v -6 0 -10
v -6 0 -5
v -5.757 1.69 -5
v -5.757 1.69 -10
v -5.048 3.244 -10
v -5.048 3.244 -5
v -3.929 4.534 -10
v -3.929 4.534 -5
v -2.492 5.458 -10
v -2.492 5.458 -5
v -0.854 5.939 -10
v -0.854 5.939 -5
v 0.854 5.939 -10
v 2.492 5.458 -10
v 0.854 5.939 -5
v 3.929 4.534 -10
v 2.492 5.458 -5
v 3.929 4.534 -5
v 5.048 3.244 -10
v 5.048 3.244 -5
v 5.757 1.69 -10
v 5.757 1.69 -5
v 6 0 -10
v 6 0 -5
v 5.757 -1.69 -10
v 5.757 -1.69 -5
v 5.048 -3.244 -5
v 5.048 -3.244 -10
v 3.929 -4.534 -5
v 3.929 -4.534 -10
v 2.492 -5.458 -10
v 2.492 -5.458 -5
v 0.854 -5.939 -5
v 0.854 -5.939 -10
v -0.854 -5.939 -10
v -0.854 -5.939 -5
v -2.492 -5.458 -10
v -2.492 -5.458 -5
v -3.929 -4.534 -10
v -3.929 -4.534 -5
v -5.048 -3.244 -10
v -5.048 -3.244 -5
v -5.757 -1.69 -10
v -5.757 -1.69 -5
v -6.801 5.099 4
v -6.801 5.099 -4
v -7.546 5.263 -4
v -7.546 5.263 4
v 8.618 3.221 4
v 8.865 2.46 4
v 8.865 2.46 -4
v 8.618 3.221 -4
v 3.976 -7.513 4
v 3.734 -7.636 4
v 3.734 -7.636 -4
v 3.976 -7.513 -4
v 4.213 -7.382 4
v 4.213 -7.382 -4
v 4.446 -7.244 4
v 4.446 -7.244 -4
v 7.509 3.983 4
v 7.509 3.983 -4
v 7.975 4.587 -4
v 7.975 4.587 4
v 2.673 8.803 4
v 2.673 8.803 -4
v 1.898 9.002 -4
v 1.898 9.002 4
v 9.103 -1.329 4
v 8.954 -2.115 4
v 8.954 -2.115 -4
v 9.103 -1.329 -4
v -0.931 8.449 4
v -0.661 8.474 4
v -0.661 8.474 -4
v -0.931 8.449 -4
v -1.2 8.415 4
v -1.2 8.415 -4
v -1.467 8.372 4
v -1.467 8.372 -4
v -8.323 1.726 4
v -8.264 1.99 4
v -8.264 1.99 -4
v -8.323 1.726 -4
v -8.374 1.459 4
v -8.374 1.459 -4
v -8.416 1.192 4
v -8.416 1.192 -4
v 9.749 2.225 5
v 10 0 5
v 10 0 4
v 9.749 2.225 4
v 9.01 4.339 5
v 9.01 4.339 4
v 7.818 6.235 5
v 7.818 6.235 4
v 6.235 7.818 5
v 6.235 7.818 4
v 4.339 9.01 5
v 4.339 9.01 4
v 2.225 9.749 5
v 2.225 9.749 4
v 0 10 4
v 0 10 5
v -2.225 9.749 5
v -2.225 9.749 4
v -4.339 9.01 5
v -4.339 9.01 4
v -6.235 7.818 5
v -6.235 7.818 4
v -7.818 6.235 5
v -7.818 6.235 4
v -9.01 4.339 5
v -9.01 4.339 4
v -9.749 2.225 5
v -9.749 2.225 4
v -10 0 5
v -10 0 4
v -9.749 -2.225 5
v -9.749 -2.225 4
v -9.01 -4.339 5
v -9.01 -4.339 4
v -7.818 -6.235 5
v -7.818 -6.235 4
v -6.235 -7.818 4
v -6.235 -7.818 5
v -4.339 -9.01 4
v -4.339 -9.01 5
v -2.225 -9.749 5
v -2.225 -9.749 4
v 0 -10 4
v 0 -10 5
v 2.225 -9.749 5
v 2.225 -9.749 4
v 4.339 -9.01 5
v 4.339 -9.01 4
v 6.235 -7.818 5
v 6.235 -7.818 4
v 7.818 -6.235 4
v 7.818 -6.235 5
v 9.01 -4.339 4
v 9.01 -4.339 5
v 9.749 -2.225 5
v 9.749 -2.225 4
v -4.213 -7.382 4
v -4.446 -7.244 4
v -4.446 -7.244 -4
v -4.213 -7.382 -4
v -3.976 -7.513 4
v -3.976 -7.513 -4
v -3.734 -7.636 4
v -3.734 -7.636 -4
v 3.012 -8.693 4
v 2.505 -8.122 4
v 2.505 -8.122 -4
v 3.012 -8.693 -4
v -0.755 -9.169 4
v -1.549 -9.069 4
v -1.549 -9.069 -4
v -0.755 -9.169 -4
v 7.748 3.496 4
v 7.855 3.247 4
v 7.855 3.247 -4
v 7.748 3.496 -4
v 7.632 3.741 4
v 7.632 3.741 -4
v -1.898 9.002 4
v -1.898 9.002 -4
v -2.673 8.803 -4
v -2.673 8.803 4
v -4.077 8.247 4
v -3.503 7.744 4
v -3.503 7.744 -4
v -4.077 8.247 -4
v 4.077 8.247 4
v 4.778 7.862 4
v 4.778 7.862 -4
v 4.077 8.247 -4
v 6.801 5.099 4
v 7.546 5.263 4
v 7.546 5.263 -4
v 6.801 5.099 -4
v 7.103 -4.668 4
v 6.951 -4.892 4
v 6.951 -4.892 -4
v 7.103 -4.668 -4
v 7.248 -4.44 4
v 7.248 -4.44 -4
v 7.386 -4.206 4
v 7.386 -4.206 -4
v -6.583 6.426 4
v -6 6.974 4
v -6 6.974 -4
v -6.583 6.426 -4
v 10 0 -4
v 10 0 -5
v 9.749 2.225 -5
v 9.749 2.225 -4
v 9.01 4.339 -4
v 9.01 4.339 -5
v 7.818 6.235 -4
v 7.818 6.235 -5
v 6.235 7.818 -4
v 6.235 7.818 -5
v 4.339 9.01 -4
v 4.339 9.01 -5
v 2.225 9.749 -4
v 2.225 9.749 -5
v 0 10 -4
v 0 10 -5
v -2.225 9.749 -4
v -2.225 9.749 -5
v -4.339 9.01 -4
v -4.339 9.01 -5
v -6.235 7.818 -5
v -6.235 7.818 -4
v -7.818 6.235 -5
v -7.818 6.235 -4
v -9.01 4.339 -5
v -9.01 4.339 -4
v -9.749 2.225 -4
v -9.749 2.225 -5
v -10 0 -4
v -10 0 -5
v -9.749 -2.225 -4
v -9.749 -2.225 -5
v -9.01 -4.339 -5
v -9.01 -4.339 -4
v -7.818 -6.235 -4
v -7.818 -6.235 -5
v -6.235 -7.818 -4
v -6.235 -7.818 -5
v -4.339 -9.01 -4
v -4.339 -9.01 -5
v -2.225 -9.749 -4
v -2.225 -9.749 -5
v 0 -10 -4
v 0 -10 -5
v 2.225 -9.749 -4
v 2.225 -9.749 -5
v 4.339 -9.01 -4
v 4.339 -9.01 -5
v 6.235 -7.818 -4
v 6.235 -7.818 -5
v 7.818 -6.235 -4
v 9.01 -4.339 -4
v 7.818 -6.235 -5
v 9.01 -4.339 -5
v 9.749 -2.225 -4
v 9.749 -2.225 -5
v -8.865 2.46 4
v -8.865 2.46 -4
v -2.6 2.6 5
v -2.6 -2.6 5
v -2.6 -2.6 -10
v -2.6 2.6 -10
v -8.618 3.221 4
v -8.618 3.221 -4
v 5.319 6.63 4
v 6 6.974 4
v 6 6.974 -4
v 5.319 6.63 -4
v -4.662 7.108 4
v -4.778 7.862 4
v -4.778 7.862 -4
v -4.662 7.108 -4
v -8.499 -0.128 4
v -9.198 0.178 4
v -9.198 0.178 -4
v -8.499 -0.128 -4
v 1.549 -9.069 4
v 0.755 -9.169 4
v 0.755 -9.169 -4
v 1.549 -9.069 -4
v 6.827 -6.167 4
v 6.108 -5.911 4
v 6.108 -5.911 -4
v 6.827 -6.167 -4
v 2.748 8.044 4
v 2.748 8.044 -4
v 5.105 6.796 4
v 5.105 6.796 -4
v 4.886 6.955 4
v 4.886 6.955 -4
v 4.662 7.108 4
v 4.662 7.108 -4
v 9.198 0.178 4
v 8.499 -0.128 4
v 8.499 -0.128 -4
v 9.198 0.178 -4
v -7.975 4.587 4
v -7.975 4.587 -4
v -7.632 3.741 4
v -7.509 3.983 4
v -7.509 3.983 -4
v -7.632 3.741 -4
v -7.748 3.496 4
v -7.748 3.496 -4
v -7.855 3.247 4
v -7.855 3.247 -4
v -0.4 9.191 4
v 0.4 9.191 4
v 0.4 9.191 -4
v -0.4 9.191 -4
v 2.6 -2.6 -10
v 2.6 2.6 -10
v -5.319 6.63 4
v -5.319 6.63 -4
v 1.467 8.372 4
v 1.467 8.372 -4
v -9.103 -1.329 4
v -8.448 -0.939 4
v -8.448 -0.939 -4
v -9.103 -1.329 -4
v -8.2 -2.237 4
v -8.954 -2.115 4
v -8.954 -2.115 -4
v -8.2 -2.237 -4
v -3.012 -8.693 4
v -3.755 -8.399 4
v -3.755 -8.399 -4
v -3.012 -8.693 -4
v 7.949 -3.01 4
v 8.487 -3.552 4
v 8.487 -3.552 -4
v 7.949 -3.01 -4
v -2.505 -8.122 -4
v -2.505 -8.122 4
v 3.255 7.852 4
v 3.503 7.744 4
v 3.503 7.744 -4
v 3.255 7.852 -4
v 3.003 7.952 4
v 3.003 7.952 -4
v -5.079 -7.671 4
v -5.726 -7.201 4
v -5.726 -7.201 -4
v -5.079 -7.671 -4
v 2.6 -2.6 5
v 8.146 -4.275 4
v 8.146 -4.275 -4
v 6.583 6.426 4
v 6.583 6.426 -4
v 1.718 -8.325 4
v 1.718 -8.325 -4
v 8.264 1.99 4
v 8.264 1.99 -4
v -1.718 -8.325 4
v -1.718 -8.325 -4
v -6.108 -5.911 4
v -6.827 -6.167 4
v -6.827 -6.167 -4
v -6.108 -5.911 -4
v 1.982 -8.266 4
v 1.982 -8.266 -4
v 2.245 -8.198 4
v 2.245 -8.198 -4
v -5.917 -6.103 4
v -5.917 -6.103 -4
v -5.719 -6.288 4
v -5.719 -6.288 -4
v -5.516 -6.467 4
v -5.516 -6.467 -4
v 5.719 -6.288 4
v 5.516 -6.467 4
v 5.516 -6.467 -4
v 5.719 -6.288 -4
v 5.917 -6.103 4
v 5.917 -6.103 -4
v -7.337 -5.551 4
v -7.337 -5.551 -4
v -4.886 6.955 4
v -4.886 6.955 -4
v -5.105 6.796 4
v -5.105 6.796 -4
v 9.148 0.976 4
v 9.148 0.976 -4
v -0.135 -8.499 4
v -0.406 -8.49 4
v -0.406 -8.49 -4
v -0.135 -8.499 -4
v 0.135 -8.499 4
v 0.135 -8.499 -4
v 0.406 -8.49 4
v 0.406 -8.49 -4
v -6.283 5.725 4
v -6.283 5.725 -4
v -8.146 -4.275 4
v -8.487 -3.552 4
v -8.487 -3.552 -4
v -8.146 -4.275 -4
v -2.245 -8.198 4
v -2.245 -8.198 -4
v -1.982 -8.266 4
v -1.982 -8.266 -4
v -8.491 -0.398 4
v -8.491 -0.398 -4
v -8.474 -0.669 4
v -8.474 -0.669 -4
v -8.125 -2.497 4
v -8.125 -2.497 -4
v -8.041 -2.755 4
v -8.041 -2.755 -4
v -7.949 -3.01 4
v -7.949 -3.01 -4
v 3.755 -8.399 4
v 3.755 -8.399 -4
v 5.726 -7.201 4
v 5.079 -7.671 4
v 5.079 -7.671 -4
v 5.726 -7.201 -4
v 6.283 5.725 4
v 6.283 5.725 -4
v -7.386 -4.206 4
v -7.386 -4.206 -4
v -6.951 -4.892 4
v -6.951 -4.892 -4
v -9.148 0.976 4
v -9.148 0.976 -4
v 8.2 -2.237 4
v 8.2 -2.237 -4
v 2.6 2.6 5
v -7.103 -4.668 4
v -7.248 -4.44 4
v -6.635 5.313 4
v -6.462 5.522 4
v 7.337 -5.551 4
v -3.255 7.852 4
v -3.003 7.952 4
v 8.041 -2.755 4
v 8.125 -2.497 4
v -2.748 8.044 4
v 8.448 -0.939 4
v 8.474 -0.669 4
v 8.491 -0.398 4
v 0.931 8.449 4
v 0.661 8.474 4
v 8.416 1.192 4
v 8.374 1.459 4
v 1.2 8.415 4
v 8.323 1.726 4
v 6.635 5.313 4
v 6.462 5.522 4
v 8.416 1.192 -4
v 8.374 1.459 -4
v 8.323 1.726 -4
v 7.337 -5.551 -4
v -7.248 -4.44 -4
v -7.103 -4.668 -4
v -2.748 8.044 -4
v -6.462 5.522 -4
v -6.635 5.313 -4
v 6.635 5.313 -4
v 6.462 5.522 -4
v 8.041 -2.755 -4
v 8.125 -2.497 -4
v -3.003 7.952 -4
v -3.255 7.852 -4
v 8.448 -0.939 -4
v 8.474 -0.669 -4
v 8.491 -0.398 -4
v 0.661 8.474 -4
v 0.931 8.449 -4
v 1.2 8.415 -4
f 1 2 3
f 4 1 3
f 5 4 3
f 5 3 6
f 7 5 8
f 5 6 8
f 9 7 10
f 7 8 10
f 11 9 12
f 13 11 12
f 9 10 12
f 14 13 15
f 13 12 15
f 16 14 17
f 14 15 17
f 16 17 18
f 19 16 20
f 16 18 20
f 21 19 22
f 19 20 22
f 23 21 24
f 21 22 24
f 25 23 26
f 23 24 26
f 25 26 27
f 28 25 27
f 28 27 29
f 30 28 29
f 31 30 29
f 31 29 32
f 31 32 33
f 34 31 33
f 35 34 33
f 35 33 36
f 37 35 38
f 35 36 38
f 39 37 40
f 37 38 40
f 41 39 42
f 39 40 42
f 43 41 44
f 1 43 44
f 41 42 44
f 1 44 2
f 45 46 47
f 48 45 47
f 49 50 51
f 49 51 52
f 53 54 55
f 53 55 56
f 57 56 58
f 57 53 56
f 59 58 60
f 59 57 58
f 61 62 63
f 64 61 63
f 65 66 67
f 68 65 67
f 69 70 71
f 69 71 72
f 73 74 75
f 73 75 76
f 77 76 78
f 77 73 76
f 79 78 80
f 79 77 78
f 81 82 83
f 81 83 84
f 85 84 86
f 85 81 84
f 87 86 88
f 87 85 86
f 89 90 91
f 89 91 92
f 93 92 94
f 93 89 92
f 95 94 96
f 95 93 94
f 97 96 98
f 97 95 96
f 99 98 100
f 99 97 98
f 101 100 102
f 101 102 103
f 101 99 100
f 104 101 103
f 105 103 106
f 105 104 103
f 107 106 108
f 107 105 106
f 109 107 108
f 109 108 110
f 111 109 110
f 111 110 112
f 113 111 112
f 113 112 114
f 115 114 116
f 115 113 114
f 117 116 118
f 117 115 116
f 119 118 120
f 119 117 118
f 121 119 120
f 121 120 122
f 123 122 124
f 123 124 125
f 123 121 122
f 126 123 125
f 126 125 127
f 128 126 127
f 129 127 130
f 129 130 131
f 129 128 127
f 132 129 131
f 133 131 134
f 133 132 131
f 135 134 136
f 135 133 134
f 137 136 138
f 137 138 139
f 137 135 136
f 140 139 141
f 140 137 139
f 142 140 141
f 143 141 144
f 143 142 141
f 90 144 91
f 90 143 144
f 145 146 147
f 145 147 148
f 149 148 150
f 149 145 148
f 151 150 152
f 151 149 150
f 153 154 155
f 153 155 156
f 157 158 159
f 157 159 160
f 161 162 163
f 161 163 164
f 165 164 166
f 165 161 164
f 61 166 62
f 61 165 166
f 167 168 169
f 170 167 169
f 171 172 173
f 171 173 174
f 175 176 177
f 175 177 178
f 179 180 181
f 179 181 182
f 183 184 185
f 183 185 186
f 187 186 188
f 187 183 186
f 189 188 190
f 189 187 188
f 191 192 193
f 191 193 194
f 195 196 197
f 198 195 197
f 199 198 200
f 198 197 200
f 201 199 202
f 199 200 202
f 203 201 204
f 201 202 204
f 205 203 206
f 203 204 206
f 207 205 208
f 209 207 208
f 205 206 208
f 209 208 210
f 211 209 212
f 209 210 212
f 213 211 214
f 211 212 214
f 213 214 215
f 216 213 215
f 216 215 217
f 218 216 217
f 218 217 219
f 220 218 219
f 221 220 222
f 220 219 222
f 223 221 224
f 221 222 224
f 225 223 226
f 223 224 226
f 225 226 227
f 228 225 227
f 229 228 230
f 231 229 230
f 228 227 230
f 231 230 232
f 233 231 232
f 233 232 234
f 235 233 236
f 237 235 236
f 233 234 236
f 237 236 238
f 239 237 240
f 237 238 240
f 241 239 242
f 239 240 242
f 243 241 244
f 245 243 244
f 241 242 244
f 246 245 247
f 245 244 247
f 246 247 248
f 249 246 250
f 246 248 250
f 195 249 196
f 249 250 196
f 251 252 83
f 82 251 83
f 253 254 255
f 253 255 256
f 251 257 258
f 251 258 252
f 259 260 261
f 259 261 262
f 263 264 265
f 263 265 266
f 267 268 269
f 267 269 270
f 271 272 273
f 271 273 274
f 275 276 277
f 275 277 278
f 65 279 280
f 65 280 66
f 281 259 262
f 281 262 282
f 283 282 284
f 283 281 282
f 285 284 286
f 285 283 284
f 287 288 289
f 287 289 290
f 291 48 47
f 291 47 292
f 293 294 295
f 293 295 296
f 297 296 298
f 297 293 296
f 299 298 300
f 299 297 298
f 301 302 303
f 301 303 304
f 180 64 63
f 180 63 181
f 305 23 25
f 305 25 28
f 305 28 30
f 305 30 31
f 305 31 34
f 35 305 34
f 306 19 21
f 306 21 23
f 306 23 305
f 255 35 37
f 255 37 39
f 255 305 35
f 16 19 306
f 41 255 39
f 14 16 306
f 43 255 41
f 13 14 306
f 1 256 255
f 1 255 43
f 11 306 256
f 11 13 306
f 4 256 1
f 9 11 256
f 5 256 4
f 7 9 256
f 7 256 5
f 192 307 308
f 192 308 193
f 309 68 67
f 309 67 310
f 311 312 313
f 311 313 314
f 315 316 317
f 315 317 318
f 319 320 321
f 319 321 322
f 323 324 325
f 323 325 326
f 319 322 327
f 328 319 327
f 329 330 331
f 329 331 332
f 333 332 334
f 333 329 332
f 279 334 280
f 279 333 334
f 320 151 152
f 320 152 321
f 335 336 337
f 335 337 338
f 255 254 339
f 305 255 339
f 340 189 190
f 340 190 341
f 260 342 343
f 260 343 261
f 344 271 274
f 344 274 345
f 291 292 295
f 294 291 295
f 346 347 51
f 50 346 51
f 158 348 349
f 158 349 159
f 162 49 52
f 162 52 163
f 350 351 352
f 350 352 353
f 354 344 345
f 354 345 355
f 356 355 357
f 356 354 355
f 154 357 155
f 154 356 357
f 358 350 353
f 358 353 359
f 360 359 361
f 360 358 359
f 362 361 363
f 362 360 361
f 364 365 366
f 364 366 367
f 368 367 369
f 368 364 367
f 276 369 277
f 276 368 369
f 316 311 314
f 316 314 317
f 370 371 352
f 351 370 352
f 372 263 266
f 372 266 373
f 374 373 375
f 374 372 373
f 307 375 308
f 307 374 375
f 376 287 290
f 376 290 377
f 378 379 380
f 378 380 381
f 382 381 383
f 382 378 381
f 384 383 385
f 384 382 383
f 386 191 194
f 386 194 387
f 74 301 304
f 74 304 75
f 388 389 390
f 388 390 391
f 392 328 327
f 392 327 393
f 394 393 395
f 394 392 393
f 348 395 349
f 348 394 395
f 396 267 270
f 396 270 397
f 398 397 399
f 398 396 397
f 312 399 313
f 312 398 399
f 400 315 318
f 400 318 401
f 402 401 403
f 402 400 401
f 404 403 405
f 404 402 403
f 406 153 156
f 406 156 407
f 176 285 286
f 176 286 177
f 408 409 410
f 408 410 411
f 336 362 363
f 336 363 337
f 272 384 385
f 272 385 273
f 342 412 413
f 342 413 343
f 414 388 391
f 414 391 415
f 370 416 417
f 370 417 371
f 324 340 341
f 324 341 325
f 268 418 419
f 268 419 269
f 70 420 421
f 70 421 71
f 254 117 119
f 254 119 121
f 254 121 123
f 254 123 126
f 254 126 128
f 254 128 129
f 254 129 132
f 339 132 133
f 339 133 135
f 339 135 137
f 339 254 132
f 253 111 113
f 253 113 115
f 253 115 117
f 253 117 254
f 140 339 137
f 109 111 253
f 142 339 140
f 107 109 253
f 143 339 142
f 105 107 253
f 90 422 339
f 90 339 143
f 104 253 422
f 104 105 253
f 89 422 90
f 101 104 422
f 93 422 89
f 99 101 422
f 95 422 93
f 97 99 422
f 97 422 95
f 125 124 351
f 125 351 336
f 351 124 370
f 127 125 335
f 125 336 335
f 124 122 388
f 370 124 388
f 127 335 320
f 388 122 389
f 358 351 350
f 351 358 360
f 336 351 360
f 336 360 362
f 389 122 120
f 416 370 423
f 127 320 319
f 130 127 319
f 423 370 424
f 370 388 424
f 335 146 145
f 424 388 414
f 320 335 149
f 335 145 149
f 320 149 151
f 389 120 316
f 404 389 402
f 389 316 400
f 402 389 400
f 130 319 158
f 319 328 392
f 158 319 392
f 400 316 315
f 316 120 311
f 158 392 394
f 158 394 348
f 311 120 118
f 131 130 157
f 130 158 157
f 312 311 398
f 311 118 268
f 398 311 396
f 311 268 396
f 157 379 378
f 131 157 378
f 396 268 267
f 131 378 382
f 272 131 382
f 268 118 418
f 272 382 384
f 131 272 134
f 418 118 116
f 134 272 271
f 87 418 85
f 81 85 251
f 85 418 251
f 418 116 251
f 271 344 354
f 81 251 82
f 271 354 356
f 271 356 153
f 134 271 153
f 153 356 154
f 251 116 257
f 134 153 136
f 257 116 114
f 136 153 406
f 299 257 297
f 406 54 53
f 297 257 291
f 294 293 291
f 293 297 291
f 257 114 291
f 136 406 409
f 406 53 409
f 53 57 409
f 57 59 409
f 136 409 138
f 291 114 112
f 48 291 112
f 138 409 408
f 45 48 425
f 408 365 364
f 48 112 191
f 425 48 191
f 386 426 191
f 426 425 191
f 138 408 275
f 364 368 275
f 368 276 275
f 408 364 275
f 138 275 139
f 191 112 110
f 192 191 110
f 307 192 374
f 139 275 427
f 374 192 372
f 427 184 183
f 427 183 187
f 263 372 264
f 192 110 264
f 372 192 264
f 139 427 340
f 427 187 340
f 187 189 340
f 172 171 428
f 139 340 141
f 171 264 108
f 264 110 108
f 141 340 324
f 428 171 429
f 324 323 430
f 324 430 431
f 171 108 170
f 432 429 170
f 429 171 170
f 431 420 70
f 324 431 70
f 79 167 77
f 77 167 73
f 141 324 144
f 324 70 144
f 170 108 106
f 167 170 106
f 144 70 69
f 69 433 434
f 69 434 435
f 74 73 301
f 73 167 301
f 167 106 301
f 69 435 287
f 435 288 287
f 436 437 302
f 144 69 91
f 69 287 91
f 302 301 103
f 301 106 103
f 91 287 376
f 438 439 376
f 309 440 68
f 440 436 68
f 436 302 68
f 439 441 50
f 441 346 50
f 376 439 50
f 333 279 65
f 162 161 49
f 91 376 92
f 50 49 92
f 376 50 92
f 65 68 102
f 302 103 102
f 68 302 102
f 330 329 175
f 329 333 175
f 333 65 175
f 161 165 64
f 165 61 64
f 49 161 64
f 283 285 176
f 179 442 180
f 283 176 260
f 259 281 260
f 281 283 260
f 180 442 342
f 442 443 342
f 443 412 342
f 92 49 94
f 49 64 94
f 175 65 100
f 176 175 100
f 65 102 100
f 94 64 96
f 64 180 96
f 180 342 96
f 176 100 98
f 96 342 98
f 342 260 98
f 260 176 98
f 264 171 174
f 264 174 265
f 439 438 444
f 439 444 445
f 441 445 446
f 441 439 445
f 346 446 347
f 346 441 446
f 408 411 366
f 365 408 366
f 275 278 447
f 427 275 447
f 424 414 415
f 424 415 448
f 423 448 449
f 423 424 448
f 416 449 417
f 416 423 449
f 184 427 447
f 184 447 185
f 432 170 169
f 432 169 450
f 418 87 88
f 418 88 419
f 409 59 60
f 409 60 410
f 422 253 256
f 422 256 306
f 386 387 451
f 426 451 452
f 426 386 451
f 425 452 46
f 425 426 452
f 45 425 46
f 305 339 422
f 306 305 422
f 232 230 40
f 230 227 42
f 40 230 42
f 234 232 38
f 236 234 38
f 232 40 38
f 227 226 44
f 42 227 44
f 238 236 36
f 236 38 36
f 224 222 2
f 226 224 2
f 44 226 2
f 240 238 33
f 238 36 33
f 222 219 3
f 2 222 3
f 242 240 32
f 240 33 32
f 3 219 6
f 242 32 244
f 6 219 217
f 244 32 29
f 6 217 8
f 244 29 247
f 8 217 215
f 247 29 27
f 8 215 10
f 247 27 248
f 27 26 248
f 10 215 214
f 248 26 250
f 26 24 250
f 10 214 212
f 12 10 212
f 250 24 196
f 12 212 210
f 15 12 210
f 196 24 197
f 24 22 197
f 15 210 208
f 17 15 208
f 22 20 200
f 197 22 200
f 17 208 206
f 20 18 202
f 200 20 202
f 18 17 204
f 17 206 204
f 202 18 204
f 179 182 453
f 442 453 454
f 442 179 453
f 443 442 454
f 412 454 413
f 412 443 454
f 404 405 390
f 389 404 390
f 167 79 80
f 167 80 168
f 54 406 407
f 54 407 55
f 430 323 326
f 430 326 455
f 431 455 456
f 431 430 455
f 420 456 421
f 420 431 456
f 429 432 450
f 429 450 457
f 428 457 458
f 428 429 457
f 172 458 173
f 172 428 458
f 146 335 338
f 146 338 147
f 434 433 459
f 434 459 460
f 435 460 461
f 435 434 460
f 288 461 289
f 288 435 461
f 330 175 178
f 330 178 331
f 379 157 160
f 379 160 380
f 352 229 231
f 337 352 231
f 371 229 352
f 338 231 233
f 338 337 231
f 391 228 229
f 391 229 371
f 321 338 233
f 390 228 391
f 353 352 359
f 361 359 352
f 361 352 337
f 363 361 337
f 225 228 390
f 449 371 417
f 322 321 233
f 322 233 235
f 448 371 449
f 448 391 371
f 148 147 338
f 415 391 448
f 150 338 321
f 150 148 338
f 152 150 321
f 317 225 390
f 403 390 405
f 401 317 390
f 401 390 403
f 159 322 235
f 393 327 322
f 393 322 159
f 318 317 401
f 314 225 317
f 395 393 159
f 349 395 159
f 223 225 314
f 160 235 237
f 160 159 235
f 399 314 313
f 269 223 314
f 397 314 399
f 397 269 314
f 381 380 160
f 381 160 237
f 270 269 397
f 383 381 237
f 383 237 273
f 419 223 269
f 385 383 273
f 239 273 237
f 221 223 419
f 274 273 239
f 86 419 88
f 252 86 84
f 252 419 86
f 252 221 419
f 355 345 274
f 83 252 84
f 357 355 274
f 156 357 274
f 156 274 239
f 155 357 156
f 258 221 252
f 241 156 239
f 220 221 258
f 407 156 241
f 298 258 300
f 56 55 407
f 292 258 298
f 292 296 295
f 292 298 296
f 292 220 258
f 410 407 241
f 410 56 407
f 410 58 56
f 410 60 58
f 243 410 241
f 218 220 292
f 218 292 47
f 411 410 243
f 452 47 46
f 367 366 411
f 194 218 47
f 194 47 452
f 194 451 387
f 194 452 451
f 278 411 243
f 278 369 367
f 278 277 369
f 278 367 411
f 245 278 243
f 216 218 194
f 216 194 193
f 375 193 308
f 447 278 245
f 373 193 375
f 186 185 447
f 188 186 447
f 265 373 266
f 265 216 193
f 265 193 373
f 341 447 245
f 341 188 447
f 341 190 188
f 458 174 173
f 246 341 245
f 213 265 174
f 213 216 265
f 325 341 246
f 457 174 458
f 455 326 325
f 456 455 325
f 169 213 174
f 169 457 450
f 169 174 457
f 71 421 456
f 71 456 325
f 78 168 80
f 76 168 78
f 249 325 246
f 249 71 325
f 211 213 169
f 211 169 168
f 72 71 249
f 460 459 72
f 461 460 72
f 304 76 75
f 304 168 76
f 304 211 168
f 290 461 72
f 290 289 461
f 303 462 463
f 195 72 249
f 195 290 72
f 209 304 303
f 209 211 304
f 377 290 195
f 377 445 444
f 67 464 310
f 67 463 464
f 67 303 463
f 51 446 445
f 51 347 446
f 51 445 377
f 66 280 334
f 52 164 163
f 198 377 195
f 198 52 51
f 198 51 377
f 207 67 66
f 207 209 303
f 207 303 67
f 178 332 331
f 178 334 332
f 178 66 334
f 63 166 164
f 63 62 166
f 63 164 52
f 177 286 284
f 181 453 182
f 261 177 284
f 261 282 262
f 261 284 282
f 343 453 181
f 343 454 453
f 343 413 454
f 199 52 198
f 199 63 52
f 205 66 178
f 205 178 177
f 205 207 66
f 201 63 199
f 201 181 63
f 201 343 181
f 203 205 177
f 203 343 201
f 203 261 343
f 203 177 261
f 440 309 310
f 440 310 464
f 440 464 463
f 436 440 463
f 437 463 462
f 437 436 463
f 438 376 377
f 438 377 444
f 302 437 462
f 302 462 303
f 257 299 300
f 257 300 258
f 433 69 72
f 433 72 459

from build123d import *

# Parameters (mm, degrees)
BOSS_EXTRUDE1_DEPTH = 5
SKETCH2_R           = 10
BOSS_EXTRUDE2_DEPTH = 1
SKETCH4_R           = 6
BOSS_EXTRUDE3_DEPTH = 5
CUT_EXTRUDE1_REACH  = 17
SKETCH5_W           = 5.2
SKETCH5_H           = 5.2


with BuildPart() as part:
    # Sketch1 → Boss-Extrude1 (new body, symmetric)
    with BuildSketch(Plane.XY):
        with BuildLine():
            Line((-0.4, 9.191300234), (-0.660980834, 8.474261286))
            ThreePointArc((-0.660980834, 8.474261286), (-1.065332485, 8.432974961), (-1.467248177, 8.372406033))
            Line((-1.467248177, 8.372406033), (-1.898350154, 9.002014591))
            Line((-1.898350154, 9.002014591), (-2.673216683, 8.803062681))
            Line((-2.673216683, 8.803062681), (-2.747677989, 8.043647535))
            ThreePointArc((-2.747677989, 8.043647535), (-3.129058698, 7.90310013), (-3.503284589, 7.744481718))
            Line((-3.503284589, 7.744481718), (-4.077419986, 8.247099263))
            Line((-4.077419986, 8.247099263), (-4.77846533, 7.861696324))
            Line((-4.77846533, 7.861696324), (-4.66172843, 7.107621828))
            ThreePointArc((-4.66172843, 7.107621828), (-4.996174644, 6.876644452), (-5.319196746, 6.629943135))
            Line((-5.319196746, 6.629943135), (-6.000290524, 6.973988359))
            Line((-6.000290524, 6.973988359), (-6.583465426, 6.426350674))
            Line((-6.583465426, 6.426350674), (-6.282865329, 5.724998101))
            ThreePointArc((-6.282865329, 5.724998101), (-6.549362564, 5.418103913), (-6.80088421, 5.098820841))
            Line((-6.80088421, 5.098820841), (-7.546140742, 5.262676117))
            Line((-7.546140742, 5.262676117), (-7.974802178, 4.587213776))
            Line((-7.974802178, 4.587213776), (-7.509226693, 3.982651688))
            ThreePointArc((-7.509226693, 3.982651688), (-7.691029946, 3.619123978), (-7.855247106, 3.247320882))
            Line((-7.855247106, 3.247320882), (-8.617839183, 3.220690579))
            Line((-8.617839183, 3.220690579), (-8.865052779, 2.459845366))
            Line((-8.865052779, 2.459845366), (-8.263755727, 1.990060623))
            ThreePointArc((-8.263755727, 1.990060623), (-8.349441631, 1.592741174), (-8.416035937, 1.191779808))
            Line((-8.416035937, 1.191779808), (-9.148047095, 0.976337208))
            Line((-9.148047095, 0.976337208), (-9.198279511, 0.177915826))
            Line((-9.198279511, 0.177915826), (-8.499042597, -0.127573271))
            ThreePointArc((-8.499042597, -0.127573271), (-8.483227192, -0.533719416), (-8.448014278, -0.938645173))
            Line((-8.448014278, -0.938645173), (-9.103449564, -1.32936302))
            Line((-9.103449564, -1.32936302), (-8.953544512, -2.115192821))
            Line((-8.953544512, -2.115192821), (-8.200303363, -2.237191266))
            ThreePointArc((-8.200303363, -2.237191266), (-8.083980389, -2.626644452), (-7.949172812, -3.010091627))
            Line((-7.949172812, -3.010091627), (-8.486848816, -3.551534481))
            Line((-8.486848816, -3.551534481), (-8.146225383, -4.275396123))
            Line((-8.146225383, -4.275396123), (-7.38630891, -4.206238307))
            ThreePointArc((-7.38630891, -4.206238307), (-7.176787367, -4.554527757), (-6.950855584, -4.892402953))
            Line((-6.950855584, -4.892402953), (-7.336988145, -5.550549969))
            Line((-7.336988145, -5.550549969), (-6.827048953, -6.166960564))
            Line((-6.827048953, -6.166960564), (-6.108205503, -5.910991925))
            ThreePointArc((-6.108205503, -5.910991925), (-5.8186504, -6.196233333), (-5.515790536, -6.467306608))
            Line((-5.515790536, -6.467306608), (-5.726117525, -7.200803989))
            Line((-5.726117525, -7.200803989), (-5.078903929, -7.671032191))
            Line((-5.078903929, -7.671032191), (-4.44630108, -7.244336181))
            ThreePointArc((-4.44630108, -7.244336181), (-4.09490623, -7.44860678), (-3.734148082, -7.635845605))
            Line((-3.734148082, -7.635845605), (-3.755453882, -8.398605012))
            Line((-3.755453882, -8.398605012), (-3.011632693, -8.693104654))
            Line((-3.011632693, -8.693104654), (-2.505019208, -8.122492153))
            ThreePointArc((-2.505019208, -8.122492153), (-2.113864041, -8.23295687), (-1.717875372, -8.324596339))
            Line((-1.717875372, -8.324596339), (-1.54882126, -9.068690793))
            Line((-1.54882126, -9.068690793), (-0.755129499, -9.16895738))
            Line((-0.755129499, -9.16895738), (-0.406337766, -8.49028207))
            ThreePointArc((-0.406337766, -8.49028207), (0, -8.5), (0.406337766, -8.49028207))
            Line((0.406337766, -8.49028207), (0.755129499, -9.16895738))
            Line((0.755129499, -9.16895738), (1.54882126, -9.068690793))
            Line((1.54882126, -9.068690793), (1.717875372, -8.324596339))
            ThreePointArc((1.717875372, -8.324596339), (2.113864041, -8.23295687), (2.505019208, -8.122492153))
            Line((2.505019208, -8.122492153), (3.011632693, -8.693104654))
            Line((3.011632693, -8.693104654), (3.755453882, -8.398605012))
            Line((3.755453882, -8.398605012), (3.734148082, -7.635845605))
            ThreePointArc((3.734148082, -7.635845605), (4.09490623, -7.44860678), (4.44630108, -7.244336181))
            Line((4.44630108, -7.244336181), (5.078903929, -7.671032191))
            Line((5.078903929, -7.671032191), (5.726117525, -7.200803989))
            Line((5.726117525, -7.200803989), (5.515790536, -6.467306608))
            ThreePointArc((5.515790536, -6.467306608), (5.8186504, -6.196233333), (6.108205503, -5.910991925))
            Line((6.108205503, -5.910991925), (6.827048953, -6.166960564))
            Line((6.827048953, -6.166960564), (7.336988145, -5.550549969))
            Line((7.336988145, -5.550549969), (6.950855584, -4.892402953))
            ThreePointArc((6.950855584, -4.892402953), (7.176787367, -4.554527757), (7.38630891, -4.206238307))
            Line((7.38630891, -4.206238307), (8.146225383, -4.275396123))
            Line((8.146225383, -4.275396123), (8.486848816, -3.551534481))
            Line((8.486848816, -3.551534481), (7.949172812, -3.010091627))
            ThreePointArc((7.949172812, -3.010091627), (8.083980389, -2.626644452), (8.200303363, -2.237191266))
            Line((8.200303363, -2.237191266), (8.953544512, -2.115192821))
            Line((8.953544512, -2.115192821), (9.103449564, -1.32936302))
            Line((9.103449564, -1.32936302), (8.448014278, -0.938645173))
            ThreePointArc((8.448014278, -0.938645173), (8.483227192, -0.533719416), (8.499042597, -0.127573271))
            Line((8.499042597, -0.127573271), (9.198279511, 0.177915826))
            Line((9.198279511, 0.177915826), (9.148047095, 0.976337208))
            Line((9.148047095, 0.976337208), (8.416035937, 1.191779808))
            ThreePointArc((8.416035937, 1.191779808), (8.349441631, 1.592741174), (8.263755727, 1.990060623))
            Line((8.263755727, 1.990060623), (8.865052779, 2.459845366))
            Line((8.865052779, 2.459845366), (8.617839183, 3.220690579))
            Line((8.617839183, 3.220690579), (7.855247106, 3.247320882))
            ThreePointArc((7.855247106, 3.247320882), (7.691029946, 3.619123978), (7.509226693, 3.982651688))
            Line((7.509226693, 3.982651688), (7.974802178, 4.587213776))
            Line((7.974802178, 4.587213776), (7.546140742, 5.262676117))
            Line((7.546140742, 5.262676117), (6.80088421, 5.098820841))
            ThreePointArc((6.80088421, 5.098820841), (6.549362564, 5.418103913), (6.282865329, 5.724998101))
            Line((6.282865329, 5.724998101), (6.583465426, 6.426350674))
            Line((6.583465426, 6.426350674), (6.000290524, 6.973988359))
            Line((6.000290524, 6.973988359), (5.319196746, 6.629943135))
            ThreePointArc((5.319196746, 6.629943135), (4.996174644, 6.876644452), (4.66172843, 7.107621828))
            Line((4.66172843, 7.107621828), (4.77846533, 7.861696324))
            Line((4.77846533, 7.861696324), (4.077419986, 8.247099263))
            Line((4.077419986, 8.247099263), (3.503284589, 7.744481718))
            ThreePointArc((3.503284589, 7.744481718), (3.129058698, 7.90310013), (2.747677989, 8.043647535))
            Line((2.747677989, 8.043647535), (2.673216683, 8.803062681))
            Line((2.673216683, 8.803062681), (1.898350154, 9.002014591))
            Line((1.898350154, 9.002014591), (1.467248177, 8.372406033))
            ThreePointArc((1.467248177, 8.372406033), (1.065332485, 8.432974961), (0.660980834, 8.474261286))
            Line((0.660980834, 8.474261286), (0.4, 9.191300234))
            Line((0.4, 9.191300234), (-0.4, 9.191300234))
        make_face()
    extrude(amount=BOSS_EXTRUDE1_DEPTH, both=True)

    # Sketch2 → Boss-Extrude2 (add)
    with BuildSketch(Plane.XY.offset(5)):
        Circle(SKETCH2_R)
    boss_extrude2 = extrude(amount=-BOSS_EXTRUDE2_DEPTH)

    # Mirror1: Boss-Extrude2 across plane
    add(boss_extrude2.mirror(Plane.XY))

    # Sketch4 → Boss-Extrude3 (add)
    with BuildSketch(Plane(origin=(0, 0, -5), x_dir=(-1, 0, 0), z_dir=(0, 0, -1))):
        Circle(SKETCH4_R)
    extrude(amount=BOSS_EXTRUDE3_DEPTH)

    # Sketch5 → Cut-Extrude1 (cut, up to next)
    with BuildSketch(Plane.XY.offset(5), mode=Mode.PRIVATE) as cut_extrude1_sk1:
        Rectangle(SKETCH5_W, SKETCH5_H)
    cut_extrude1_tool1 = extrude(cut_extrude1_sk1.sketch, amount=-CUT_EXTRUDE1_REACH, mode=Mode.PRIVATE) & part.part
    add(cut_extrude1_tool1.solids().sort_by_distance((0, 0, 5))[0], mode=Mode.SUBTRACT)


solid = part.part
